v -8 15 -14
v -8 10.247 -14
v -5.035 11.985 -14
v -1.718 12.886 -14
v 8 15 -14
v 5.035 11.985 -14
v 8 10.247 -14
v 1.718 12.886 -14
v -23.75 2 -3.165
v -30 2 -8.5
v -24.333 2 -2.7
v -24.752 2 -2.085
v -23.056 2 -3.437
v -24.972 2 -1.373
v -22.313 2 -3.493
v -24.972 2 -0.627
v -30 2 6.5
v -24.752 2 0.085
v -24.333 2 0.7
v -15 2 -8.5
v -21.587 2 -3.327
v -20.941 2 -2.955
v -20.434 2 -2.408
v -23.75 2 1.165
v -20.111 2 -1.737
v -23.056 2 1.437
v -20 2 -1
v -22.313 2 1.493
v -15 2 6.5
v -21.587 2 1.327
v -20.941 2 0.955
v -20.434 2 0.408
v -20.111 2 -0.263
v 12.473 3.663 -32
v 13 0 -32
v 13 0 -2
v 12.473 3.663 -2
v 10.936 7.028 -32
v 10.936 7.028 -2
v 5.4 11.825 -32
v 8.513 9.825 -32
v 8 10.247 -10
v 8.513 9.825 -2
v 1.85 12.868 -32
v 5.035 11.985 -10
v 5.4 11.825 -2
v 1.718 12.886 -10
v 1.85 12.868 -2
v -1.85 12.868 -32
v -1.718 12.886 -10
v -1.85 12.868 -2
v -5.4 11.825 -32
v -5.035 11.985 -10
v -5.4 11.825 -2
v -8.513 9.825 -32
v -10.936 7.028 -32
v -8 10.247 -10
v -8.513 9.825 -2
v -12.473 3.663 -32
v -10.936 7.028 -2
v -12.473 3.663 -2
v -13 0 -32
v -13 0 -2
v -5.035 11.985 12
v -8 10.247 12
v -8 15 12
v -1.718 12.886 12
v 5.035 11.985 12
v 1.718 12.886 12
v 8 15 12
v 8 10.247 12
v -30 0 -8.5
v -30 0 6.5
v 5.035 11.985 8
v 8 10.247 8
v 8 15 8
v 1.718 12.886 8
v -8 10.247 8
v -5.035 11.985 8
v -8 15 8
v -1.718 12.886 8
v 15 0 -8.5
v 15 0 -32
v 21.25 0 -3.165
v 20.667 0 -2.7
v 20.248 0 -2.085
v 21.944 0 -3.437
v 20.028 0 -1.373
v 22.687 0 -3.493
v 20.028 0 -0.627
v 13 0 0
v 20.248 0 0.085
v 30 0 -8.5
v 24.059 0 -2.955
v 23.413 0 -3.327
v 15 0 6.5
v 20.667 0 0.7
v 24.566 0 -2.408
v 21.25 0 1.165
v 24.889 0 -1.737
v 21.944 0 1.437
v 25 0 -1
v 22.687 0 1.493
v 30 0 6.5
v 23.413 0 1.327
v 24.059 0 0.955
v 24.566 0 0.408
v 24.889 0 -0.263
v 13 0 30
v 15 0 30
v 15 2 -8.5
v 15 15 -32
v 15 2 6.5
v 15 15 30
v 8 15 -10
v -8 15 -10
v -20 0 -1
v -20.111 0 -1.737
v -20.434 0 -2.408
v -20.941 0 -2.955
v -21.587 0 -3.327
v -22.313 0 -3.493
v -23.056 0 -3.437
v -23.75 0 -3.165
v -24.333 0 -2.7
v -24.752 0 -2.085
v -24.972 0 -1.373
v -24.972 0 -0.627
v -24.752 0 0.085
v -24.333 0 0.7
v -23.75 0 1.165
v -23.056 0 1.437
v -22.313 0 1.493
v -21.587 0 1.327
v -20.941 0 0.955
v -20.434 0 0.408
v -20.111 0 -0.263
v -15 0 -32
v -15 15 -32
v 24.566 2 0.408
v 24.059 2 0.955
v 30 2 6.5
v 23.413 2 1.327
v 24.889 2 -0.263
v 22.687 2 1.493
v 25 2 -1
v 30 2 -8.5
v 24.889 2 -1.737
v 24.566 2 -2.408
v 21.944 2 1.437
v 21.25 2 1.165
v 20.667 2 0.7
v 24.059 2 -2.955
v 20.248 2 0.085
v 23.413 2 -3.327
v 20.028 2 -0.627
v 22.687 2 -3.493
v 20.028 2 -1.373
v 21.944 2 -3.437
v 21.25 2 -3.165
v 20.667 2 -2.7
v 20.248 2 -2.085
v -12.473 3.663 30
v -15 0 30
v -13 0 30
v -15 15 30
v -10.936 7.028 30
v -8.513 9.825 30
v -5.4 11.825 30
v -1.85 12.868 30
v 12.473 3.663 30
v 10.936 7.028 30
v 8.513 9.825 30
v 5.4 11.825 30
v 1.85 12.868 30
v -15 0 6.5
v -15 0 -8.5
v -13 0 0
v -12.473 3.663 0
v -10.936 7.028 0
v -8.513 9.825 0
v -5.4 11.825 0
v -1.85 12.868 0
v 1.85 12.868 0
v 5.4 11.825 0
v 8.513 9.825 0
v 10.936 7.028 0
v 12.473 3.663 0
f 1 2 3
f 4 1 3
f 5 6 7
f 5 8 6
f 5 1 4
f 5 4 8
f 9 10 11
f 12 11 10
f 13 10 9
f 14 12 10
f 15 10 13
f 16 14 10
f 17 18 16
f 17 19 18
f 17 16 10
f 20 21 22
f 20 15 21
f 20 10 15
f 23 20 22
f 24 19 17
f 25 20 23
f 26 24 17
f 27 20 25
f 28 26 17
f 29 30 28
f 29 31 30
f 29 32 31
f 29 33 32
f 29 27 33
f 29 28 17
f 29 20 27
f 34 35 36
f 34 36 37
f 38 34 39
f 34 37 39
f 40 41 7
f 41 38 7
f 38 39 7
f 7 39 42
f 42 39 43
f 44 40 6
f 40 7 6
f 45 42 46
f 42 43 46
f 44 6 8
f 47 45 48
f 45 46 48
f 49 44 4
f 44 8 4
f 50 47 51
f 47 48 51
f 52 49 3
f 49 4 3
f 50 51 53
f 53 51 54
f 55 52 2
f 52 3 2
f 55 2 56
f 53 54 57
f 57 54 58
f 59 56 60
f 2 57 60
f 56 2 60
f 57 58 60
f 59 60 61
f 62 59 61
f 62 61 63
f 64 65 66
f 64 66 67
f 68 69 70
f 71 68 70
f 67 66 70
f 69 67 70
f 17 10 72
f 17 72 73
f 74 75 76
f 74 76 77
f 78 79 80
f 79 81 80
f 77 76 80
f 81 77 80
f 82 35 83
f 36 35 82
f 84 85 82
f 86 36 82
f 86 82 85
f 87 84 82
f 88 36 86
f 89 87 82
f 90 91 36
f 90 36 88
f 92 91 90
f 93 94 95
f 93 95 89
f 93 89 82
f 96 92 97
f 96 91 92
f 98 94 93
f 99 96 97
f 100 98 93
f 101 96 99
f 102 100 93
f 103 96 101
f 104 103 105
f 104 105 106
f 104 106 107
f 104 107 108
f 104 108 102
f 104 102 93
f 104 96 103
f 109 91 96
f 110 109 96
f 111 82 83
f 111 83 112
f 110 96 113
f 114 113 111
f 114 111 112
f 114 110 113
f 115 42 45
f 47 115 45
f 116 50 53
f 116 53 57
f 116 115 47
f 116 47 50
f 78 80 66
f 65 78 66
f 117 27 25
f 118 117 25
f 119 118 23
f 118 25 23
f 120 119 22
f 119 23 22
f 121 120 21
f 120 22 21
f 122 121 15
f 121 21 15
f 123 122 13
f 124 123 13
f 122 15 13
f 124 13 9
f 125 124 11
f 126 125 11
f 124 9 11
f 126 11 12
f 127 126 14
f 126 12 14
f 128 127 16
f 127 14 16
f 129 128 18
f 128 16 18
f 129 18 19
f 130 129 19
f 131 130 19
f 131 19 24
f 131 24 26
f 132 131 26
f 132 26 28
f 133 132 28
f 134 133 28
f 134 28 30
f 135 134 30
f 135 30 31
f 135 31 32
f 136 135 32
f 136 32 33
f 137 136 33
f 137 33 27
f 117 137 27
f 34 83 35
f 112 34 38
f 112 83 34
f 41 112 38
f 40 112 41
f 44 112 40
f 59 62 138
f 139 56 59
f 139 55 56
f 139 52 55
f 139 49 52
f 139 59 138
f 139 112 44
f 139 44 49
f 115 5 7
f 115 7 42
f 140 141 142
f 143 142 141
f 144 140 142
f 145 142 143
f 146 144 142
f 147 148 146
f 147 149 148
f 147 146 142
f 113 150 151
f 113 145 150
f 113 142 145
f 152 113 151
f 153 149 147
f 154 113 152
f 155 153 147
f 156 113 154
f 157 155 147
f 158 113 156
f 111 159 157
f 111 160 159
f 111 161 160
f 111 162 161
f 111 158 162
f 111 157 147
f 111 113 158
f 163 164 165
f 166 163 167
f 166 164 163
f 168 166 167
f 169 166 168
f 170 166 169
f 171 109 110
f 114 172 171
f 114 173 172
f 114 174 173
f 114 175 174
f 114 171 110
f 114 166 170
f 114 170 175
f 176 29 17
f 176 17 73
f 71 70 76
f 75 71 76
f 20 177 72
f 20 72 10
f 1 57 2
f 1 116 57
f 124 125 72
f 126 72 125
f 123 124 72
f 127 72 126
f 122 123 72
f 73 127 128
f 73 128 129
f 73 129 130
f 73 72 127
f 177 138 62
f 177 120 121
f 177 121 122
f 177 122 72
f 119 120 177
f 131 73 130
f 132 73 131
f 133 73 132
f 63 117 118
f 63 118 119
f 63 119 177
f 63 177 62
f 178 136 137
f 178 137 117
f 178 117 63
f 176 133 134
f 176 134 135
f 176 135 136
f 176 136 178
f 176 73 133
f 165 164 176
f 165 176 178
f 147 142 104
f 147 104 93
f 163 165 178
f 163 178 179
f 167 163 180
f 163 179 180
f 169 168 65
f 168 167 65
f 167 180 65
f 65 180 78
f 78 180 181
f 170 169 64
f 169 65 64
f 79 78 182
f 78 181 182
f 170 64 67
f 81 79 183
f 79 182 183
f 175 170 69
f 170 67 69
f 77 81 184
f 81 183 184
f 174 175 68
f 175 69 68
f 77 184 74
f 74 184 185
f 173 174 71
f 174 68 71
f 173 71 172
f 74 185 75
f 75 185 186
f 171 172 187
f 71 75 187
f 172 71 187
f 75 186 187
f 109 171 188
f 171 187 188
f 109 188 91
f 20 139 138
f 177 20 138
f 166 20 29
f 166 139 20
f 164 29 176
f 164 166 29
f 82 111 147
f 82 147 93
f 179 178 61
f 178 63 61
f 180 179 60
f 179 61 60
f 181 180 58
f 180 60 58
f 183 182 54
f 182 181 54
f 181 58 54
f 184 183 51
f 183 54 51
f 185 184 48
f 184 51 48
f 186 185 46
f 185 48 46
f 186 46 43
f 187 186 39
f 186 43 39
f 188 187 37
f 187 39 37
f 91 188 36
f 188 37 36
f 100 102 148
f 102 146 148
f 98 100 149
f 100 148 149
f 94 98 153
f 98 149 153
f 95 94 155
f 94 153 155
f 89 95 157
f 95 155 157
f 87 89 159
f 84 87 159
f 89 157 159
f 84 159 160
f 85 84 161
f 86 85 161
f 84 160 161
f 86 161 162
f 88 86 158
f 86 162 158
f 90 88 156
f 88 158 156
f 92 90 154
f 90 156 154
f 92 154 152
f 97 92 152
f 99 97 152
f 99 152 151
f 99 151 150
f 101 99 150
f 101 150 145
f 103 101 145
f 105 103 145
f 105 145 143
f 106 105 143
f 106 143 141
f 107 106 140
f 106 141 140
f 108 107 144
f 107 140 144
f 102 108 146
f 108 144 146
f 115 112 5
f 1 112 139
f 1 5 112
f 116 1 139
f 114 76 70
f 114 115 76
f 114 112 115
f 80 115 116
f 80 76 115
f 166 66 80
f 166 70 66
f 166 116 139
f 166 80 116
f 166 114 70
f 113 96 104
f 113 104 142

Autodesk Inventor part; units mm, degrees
ref_plane "YZ Plane" through (0, 0, 0) normal (1, 0, 0) x (0, 1, 0)
ref_plane "XZ Plane" through (0, 0, 0) normal (0, 1, 0) x (-1, 0, 0)
ref_plane "XY Plane" through (0, 0, 0) normal (0, 0, 1) x (1, 0, 0)
sketch "Skizze4" plane through (0, 0, 0) normal (0, 0, 1) x (1, 0, 0)
  line L0 (15, 15) -> (-15, 15)
  line L1 (-15, 15) -> (-15, 0)
  line L2 (-15, -15) -> (15, 15) construction
  line L3 (15, -15) -> (-15, 15) construction
  line L4 (-15, 0) -> (15, 0)
  arc A0 (13, 0) -> (-13, 0) centre (0, 0) ccw
  line L5 (15, 0) -> (15, 15)
  dimension "d9" = 30
  dimension "d10" = 30
extrude "Extrusion4" add sketch "Skizze4" along normal blind 30 contours L5 L4 A0 L1 L0
sketch "Skizze5" plane through (0, 0, 0) normal (0, 0, -1) x (-1, 0, 0)
  line L0 (-15, 0) -> (-15, 15) projected
  line L1 (15, 0) -> (13, 0) projected
  line L2 (-15, 15) -> (15, 15)
  line L3 (15, 15) -> (15, 0)
  line L4 (15, 0) -> (-15, 0)
  line L5 (-15, 0) -> (-15, 15)
  point P0 (0, 0)
extrude "Extrusion5" add sketch "Skizze5" along normal blind 2
sketch "Skizze6" plane through (0, 0, -2) normal (0, 0, -1) x (-1, 0, 0)
  line L0 (-15, 0) -> (-15, 15) projected
  line L1 (15, 0) -> (13, 0) projected
  line L2 (-15, 15) -> (15, 15)
  line L3 (15, 15) -> (15, 0)
  line L4 (15, 0) -> (-15, 0)
  line L5 (-15, 0) -> (-15, 15)
  arc A0 (13, 0) -> (-13, 0) centre (0, 0) ccw
  dimension "d16" = 26
extrude "Extrusion6" add sketch "Skizze6" along normal blind 30 contours L0 L2 L3 L1 A0 L4
sketch "Skizze9" plane through (15, 0, 30) normal (1, 0, 0) x (0, 0, -1)
  line L0 (0, 0) -> (0, 13) projected
  line L1 (62, 13) -> (62, 0) projected
  line L2 (62, 0) -> (0, 0) projected
  line L3 (23.5, 2) -> (38.5, 2)
  line L4 (38.5, 2) -> (38.5, 0)
  line L5 (38.5, 0) -> (23.5, 0)
  line L6 (23.5, 0) -> (23.5, 2)
  line L7 (23.5, 2) -> (38.5, 0) construction
  line L8 (38.5, 2) -> (23.5, 0) construction
  point P0 (30, 0)
  point P1 (31, 1)
  dimension "d36" = 15
extrude "Extrusion8" add sketch "Skizze9" along normal blind 15
sketch "Skizze10" plane through (-15, 0, 30) normal (-1, 0, 0) x (0, 0, 1)
  line L0 (0, 0) -> (0, 15) projected
  line L1 (0, 6.5004) -> (31, 6.5004) construction
  line L2 (0, 0) -> (-62, 0) projected
  line L3 (-31, 0) -> (-31, 1)
  line L4 (-38.5, 2) -> (-23.5, 2)
  line L5 (-23.5, 2) -> (-23.5, 0)
  line L6 (-23.5, 0) -> (-38.5, 0)
  line L7 (-38.5, 0) -> (-38.5, 2)
  line L8 (-38.5, 2) -> (-23.5, 0) construction
  line L9 (-23.5, 2) -> (-38.5, 0) construction
  point P0 (-30, 0)
  dimension "d41" = 1
  dimension "d42" = 15
  dimension "d43" = 2
extrude "Extrusion9" add sketch "Skizze10" along normal blind 15
sketch "Skizze11" plane through (-15, 15, 30) normal (0, 1, 0) x (1, 0, 0)
  line L0 (0, 23.5) -> (-15, 23.5) projected
  line L1 (0, 62) -> (0, 0) projected
  line L2 (30, 62) -> (30, 0) projected
  line L3 (23, 22) -> (7, 22)
  line L4 (7, 22) -> (7, 18)
  line L5 (7, 18) -> (23, 18)
  line L6 (23, 18) -> (23, 22)
  line L7 (23, 22) -> (7, 18) construction
  line L8 (7, 22) -> (23, 18) construction
  line L9 (7, 44) -> (23, 44)
  line L10 (23, 44) -> (23, 40)
  line L11 (23, 40) -> (7, 40)
  line L12 (7, 40) -> (7, 44)
  line L13 (7, 44) -> (23, 40) construction
  line L14 (23, 44) -> (7, 40) construction
  point P0 (15, 30)
  dimension "d55" = 16
  dimension "d56" = 4
  dimension "d58" = 16
  dimension "d59" = 4
extrude "Extrusion10" cut sketch "Skizze11" against normal through all
sketch "Skizze12" plane through (-15, 2, 6.5) normal (0, 1, 0) x (1, 0, 0)
  line L0 (-15, 15) -> (-15, 0) projected
  line L1 (0, 38.5) -> (0, -23.5) projected
  line L2 (-15, 0) -> (6.2132, 0) construction
  circle A0 centre (-7.5, 7.5) radius 2.5
  point P0 (15, 6.5)
  dimension "d63" = 5
extrude "Extrusion11" cut sketch "Skizze12" against normal through all
sketch "Skizze13" plane through (15, 2, 6.5) normal (0, 1, 0) x (1, 0, 0)
  line L0 (0, 0) -> (15, 0) projected
  line L1 (0, 38.5) -> (0, -23.5) projected
  line L2 (15, 0) -> (36.2132, 0) construction
  circle A0 centre (7.5, 7.5) radius 2.5
  point P0 (-15, 6.5)
  dimension "d67" = 5
extrude "Extrusion12" cut sketch "Skizze13" against normal blind 10
sketch "Skizze15" plane through (0, 0, -2) normal (0, 0, -1) x (-1, 0, 0)
  circle A0 centre (0, 0) radius 13
extrude "Extrusion14" cut sketch "Skizze15" against normal blind 2
properties part number "Motorhalterung_Teil2"
